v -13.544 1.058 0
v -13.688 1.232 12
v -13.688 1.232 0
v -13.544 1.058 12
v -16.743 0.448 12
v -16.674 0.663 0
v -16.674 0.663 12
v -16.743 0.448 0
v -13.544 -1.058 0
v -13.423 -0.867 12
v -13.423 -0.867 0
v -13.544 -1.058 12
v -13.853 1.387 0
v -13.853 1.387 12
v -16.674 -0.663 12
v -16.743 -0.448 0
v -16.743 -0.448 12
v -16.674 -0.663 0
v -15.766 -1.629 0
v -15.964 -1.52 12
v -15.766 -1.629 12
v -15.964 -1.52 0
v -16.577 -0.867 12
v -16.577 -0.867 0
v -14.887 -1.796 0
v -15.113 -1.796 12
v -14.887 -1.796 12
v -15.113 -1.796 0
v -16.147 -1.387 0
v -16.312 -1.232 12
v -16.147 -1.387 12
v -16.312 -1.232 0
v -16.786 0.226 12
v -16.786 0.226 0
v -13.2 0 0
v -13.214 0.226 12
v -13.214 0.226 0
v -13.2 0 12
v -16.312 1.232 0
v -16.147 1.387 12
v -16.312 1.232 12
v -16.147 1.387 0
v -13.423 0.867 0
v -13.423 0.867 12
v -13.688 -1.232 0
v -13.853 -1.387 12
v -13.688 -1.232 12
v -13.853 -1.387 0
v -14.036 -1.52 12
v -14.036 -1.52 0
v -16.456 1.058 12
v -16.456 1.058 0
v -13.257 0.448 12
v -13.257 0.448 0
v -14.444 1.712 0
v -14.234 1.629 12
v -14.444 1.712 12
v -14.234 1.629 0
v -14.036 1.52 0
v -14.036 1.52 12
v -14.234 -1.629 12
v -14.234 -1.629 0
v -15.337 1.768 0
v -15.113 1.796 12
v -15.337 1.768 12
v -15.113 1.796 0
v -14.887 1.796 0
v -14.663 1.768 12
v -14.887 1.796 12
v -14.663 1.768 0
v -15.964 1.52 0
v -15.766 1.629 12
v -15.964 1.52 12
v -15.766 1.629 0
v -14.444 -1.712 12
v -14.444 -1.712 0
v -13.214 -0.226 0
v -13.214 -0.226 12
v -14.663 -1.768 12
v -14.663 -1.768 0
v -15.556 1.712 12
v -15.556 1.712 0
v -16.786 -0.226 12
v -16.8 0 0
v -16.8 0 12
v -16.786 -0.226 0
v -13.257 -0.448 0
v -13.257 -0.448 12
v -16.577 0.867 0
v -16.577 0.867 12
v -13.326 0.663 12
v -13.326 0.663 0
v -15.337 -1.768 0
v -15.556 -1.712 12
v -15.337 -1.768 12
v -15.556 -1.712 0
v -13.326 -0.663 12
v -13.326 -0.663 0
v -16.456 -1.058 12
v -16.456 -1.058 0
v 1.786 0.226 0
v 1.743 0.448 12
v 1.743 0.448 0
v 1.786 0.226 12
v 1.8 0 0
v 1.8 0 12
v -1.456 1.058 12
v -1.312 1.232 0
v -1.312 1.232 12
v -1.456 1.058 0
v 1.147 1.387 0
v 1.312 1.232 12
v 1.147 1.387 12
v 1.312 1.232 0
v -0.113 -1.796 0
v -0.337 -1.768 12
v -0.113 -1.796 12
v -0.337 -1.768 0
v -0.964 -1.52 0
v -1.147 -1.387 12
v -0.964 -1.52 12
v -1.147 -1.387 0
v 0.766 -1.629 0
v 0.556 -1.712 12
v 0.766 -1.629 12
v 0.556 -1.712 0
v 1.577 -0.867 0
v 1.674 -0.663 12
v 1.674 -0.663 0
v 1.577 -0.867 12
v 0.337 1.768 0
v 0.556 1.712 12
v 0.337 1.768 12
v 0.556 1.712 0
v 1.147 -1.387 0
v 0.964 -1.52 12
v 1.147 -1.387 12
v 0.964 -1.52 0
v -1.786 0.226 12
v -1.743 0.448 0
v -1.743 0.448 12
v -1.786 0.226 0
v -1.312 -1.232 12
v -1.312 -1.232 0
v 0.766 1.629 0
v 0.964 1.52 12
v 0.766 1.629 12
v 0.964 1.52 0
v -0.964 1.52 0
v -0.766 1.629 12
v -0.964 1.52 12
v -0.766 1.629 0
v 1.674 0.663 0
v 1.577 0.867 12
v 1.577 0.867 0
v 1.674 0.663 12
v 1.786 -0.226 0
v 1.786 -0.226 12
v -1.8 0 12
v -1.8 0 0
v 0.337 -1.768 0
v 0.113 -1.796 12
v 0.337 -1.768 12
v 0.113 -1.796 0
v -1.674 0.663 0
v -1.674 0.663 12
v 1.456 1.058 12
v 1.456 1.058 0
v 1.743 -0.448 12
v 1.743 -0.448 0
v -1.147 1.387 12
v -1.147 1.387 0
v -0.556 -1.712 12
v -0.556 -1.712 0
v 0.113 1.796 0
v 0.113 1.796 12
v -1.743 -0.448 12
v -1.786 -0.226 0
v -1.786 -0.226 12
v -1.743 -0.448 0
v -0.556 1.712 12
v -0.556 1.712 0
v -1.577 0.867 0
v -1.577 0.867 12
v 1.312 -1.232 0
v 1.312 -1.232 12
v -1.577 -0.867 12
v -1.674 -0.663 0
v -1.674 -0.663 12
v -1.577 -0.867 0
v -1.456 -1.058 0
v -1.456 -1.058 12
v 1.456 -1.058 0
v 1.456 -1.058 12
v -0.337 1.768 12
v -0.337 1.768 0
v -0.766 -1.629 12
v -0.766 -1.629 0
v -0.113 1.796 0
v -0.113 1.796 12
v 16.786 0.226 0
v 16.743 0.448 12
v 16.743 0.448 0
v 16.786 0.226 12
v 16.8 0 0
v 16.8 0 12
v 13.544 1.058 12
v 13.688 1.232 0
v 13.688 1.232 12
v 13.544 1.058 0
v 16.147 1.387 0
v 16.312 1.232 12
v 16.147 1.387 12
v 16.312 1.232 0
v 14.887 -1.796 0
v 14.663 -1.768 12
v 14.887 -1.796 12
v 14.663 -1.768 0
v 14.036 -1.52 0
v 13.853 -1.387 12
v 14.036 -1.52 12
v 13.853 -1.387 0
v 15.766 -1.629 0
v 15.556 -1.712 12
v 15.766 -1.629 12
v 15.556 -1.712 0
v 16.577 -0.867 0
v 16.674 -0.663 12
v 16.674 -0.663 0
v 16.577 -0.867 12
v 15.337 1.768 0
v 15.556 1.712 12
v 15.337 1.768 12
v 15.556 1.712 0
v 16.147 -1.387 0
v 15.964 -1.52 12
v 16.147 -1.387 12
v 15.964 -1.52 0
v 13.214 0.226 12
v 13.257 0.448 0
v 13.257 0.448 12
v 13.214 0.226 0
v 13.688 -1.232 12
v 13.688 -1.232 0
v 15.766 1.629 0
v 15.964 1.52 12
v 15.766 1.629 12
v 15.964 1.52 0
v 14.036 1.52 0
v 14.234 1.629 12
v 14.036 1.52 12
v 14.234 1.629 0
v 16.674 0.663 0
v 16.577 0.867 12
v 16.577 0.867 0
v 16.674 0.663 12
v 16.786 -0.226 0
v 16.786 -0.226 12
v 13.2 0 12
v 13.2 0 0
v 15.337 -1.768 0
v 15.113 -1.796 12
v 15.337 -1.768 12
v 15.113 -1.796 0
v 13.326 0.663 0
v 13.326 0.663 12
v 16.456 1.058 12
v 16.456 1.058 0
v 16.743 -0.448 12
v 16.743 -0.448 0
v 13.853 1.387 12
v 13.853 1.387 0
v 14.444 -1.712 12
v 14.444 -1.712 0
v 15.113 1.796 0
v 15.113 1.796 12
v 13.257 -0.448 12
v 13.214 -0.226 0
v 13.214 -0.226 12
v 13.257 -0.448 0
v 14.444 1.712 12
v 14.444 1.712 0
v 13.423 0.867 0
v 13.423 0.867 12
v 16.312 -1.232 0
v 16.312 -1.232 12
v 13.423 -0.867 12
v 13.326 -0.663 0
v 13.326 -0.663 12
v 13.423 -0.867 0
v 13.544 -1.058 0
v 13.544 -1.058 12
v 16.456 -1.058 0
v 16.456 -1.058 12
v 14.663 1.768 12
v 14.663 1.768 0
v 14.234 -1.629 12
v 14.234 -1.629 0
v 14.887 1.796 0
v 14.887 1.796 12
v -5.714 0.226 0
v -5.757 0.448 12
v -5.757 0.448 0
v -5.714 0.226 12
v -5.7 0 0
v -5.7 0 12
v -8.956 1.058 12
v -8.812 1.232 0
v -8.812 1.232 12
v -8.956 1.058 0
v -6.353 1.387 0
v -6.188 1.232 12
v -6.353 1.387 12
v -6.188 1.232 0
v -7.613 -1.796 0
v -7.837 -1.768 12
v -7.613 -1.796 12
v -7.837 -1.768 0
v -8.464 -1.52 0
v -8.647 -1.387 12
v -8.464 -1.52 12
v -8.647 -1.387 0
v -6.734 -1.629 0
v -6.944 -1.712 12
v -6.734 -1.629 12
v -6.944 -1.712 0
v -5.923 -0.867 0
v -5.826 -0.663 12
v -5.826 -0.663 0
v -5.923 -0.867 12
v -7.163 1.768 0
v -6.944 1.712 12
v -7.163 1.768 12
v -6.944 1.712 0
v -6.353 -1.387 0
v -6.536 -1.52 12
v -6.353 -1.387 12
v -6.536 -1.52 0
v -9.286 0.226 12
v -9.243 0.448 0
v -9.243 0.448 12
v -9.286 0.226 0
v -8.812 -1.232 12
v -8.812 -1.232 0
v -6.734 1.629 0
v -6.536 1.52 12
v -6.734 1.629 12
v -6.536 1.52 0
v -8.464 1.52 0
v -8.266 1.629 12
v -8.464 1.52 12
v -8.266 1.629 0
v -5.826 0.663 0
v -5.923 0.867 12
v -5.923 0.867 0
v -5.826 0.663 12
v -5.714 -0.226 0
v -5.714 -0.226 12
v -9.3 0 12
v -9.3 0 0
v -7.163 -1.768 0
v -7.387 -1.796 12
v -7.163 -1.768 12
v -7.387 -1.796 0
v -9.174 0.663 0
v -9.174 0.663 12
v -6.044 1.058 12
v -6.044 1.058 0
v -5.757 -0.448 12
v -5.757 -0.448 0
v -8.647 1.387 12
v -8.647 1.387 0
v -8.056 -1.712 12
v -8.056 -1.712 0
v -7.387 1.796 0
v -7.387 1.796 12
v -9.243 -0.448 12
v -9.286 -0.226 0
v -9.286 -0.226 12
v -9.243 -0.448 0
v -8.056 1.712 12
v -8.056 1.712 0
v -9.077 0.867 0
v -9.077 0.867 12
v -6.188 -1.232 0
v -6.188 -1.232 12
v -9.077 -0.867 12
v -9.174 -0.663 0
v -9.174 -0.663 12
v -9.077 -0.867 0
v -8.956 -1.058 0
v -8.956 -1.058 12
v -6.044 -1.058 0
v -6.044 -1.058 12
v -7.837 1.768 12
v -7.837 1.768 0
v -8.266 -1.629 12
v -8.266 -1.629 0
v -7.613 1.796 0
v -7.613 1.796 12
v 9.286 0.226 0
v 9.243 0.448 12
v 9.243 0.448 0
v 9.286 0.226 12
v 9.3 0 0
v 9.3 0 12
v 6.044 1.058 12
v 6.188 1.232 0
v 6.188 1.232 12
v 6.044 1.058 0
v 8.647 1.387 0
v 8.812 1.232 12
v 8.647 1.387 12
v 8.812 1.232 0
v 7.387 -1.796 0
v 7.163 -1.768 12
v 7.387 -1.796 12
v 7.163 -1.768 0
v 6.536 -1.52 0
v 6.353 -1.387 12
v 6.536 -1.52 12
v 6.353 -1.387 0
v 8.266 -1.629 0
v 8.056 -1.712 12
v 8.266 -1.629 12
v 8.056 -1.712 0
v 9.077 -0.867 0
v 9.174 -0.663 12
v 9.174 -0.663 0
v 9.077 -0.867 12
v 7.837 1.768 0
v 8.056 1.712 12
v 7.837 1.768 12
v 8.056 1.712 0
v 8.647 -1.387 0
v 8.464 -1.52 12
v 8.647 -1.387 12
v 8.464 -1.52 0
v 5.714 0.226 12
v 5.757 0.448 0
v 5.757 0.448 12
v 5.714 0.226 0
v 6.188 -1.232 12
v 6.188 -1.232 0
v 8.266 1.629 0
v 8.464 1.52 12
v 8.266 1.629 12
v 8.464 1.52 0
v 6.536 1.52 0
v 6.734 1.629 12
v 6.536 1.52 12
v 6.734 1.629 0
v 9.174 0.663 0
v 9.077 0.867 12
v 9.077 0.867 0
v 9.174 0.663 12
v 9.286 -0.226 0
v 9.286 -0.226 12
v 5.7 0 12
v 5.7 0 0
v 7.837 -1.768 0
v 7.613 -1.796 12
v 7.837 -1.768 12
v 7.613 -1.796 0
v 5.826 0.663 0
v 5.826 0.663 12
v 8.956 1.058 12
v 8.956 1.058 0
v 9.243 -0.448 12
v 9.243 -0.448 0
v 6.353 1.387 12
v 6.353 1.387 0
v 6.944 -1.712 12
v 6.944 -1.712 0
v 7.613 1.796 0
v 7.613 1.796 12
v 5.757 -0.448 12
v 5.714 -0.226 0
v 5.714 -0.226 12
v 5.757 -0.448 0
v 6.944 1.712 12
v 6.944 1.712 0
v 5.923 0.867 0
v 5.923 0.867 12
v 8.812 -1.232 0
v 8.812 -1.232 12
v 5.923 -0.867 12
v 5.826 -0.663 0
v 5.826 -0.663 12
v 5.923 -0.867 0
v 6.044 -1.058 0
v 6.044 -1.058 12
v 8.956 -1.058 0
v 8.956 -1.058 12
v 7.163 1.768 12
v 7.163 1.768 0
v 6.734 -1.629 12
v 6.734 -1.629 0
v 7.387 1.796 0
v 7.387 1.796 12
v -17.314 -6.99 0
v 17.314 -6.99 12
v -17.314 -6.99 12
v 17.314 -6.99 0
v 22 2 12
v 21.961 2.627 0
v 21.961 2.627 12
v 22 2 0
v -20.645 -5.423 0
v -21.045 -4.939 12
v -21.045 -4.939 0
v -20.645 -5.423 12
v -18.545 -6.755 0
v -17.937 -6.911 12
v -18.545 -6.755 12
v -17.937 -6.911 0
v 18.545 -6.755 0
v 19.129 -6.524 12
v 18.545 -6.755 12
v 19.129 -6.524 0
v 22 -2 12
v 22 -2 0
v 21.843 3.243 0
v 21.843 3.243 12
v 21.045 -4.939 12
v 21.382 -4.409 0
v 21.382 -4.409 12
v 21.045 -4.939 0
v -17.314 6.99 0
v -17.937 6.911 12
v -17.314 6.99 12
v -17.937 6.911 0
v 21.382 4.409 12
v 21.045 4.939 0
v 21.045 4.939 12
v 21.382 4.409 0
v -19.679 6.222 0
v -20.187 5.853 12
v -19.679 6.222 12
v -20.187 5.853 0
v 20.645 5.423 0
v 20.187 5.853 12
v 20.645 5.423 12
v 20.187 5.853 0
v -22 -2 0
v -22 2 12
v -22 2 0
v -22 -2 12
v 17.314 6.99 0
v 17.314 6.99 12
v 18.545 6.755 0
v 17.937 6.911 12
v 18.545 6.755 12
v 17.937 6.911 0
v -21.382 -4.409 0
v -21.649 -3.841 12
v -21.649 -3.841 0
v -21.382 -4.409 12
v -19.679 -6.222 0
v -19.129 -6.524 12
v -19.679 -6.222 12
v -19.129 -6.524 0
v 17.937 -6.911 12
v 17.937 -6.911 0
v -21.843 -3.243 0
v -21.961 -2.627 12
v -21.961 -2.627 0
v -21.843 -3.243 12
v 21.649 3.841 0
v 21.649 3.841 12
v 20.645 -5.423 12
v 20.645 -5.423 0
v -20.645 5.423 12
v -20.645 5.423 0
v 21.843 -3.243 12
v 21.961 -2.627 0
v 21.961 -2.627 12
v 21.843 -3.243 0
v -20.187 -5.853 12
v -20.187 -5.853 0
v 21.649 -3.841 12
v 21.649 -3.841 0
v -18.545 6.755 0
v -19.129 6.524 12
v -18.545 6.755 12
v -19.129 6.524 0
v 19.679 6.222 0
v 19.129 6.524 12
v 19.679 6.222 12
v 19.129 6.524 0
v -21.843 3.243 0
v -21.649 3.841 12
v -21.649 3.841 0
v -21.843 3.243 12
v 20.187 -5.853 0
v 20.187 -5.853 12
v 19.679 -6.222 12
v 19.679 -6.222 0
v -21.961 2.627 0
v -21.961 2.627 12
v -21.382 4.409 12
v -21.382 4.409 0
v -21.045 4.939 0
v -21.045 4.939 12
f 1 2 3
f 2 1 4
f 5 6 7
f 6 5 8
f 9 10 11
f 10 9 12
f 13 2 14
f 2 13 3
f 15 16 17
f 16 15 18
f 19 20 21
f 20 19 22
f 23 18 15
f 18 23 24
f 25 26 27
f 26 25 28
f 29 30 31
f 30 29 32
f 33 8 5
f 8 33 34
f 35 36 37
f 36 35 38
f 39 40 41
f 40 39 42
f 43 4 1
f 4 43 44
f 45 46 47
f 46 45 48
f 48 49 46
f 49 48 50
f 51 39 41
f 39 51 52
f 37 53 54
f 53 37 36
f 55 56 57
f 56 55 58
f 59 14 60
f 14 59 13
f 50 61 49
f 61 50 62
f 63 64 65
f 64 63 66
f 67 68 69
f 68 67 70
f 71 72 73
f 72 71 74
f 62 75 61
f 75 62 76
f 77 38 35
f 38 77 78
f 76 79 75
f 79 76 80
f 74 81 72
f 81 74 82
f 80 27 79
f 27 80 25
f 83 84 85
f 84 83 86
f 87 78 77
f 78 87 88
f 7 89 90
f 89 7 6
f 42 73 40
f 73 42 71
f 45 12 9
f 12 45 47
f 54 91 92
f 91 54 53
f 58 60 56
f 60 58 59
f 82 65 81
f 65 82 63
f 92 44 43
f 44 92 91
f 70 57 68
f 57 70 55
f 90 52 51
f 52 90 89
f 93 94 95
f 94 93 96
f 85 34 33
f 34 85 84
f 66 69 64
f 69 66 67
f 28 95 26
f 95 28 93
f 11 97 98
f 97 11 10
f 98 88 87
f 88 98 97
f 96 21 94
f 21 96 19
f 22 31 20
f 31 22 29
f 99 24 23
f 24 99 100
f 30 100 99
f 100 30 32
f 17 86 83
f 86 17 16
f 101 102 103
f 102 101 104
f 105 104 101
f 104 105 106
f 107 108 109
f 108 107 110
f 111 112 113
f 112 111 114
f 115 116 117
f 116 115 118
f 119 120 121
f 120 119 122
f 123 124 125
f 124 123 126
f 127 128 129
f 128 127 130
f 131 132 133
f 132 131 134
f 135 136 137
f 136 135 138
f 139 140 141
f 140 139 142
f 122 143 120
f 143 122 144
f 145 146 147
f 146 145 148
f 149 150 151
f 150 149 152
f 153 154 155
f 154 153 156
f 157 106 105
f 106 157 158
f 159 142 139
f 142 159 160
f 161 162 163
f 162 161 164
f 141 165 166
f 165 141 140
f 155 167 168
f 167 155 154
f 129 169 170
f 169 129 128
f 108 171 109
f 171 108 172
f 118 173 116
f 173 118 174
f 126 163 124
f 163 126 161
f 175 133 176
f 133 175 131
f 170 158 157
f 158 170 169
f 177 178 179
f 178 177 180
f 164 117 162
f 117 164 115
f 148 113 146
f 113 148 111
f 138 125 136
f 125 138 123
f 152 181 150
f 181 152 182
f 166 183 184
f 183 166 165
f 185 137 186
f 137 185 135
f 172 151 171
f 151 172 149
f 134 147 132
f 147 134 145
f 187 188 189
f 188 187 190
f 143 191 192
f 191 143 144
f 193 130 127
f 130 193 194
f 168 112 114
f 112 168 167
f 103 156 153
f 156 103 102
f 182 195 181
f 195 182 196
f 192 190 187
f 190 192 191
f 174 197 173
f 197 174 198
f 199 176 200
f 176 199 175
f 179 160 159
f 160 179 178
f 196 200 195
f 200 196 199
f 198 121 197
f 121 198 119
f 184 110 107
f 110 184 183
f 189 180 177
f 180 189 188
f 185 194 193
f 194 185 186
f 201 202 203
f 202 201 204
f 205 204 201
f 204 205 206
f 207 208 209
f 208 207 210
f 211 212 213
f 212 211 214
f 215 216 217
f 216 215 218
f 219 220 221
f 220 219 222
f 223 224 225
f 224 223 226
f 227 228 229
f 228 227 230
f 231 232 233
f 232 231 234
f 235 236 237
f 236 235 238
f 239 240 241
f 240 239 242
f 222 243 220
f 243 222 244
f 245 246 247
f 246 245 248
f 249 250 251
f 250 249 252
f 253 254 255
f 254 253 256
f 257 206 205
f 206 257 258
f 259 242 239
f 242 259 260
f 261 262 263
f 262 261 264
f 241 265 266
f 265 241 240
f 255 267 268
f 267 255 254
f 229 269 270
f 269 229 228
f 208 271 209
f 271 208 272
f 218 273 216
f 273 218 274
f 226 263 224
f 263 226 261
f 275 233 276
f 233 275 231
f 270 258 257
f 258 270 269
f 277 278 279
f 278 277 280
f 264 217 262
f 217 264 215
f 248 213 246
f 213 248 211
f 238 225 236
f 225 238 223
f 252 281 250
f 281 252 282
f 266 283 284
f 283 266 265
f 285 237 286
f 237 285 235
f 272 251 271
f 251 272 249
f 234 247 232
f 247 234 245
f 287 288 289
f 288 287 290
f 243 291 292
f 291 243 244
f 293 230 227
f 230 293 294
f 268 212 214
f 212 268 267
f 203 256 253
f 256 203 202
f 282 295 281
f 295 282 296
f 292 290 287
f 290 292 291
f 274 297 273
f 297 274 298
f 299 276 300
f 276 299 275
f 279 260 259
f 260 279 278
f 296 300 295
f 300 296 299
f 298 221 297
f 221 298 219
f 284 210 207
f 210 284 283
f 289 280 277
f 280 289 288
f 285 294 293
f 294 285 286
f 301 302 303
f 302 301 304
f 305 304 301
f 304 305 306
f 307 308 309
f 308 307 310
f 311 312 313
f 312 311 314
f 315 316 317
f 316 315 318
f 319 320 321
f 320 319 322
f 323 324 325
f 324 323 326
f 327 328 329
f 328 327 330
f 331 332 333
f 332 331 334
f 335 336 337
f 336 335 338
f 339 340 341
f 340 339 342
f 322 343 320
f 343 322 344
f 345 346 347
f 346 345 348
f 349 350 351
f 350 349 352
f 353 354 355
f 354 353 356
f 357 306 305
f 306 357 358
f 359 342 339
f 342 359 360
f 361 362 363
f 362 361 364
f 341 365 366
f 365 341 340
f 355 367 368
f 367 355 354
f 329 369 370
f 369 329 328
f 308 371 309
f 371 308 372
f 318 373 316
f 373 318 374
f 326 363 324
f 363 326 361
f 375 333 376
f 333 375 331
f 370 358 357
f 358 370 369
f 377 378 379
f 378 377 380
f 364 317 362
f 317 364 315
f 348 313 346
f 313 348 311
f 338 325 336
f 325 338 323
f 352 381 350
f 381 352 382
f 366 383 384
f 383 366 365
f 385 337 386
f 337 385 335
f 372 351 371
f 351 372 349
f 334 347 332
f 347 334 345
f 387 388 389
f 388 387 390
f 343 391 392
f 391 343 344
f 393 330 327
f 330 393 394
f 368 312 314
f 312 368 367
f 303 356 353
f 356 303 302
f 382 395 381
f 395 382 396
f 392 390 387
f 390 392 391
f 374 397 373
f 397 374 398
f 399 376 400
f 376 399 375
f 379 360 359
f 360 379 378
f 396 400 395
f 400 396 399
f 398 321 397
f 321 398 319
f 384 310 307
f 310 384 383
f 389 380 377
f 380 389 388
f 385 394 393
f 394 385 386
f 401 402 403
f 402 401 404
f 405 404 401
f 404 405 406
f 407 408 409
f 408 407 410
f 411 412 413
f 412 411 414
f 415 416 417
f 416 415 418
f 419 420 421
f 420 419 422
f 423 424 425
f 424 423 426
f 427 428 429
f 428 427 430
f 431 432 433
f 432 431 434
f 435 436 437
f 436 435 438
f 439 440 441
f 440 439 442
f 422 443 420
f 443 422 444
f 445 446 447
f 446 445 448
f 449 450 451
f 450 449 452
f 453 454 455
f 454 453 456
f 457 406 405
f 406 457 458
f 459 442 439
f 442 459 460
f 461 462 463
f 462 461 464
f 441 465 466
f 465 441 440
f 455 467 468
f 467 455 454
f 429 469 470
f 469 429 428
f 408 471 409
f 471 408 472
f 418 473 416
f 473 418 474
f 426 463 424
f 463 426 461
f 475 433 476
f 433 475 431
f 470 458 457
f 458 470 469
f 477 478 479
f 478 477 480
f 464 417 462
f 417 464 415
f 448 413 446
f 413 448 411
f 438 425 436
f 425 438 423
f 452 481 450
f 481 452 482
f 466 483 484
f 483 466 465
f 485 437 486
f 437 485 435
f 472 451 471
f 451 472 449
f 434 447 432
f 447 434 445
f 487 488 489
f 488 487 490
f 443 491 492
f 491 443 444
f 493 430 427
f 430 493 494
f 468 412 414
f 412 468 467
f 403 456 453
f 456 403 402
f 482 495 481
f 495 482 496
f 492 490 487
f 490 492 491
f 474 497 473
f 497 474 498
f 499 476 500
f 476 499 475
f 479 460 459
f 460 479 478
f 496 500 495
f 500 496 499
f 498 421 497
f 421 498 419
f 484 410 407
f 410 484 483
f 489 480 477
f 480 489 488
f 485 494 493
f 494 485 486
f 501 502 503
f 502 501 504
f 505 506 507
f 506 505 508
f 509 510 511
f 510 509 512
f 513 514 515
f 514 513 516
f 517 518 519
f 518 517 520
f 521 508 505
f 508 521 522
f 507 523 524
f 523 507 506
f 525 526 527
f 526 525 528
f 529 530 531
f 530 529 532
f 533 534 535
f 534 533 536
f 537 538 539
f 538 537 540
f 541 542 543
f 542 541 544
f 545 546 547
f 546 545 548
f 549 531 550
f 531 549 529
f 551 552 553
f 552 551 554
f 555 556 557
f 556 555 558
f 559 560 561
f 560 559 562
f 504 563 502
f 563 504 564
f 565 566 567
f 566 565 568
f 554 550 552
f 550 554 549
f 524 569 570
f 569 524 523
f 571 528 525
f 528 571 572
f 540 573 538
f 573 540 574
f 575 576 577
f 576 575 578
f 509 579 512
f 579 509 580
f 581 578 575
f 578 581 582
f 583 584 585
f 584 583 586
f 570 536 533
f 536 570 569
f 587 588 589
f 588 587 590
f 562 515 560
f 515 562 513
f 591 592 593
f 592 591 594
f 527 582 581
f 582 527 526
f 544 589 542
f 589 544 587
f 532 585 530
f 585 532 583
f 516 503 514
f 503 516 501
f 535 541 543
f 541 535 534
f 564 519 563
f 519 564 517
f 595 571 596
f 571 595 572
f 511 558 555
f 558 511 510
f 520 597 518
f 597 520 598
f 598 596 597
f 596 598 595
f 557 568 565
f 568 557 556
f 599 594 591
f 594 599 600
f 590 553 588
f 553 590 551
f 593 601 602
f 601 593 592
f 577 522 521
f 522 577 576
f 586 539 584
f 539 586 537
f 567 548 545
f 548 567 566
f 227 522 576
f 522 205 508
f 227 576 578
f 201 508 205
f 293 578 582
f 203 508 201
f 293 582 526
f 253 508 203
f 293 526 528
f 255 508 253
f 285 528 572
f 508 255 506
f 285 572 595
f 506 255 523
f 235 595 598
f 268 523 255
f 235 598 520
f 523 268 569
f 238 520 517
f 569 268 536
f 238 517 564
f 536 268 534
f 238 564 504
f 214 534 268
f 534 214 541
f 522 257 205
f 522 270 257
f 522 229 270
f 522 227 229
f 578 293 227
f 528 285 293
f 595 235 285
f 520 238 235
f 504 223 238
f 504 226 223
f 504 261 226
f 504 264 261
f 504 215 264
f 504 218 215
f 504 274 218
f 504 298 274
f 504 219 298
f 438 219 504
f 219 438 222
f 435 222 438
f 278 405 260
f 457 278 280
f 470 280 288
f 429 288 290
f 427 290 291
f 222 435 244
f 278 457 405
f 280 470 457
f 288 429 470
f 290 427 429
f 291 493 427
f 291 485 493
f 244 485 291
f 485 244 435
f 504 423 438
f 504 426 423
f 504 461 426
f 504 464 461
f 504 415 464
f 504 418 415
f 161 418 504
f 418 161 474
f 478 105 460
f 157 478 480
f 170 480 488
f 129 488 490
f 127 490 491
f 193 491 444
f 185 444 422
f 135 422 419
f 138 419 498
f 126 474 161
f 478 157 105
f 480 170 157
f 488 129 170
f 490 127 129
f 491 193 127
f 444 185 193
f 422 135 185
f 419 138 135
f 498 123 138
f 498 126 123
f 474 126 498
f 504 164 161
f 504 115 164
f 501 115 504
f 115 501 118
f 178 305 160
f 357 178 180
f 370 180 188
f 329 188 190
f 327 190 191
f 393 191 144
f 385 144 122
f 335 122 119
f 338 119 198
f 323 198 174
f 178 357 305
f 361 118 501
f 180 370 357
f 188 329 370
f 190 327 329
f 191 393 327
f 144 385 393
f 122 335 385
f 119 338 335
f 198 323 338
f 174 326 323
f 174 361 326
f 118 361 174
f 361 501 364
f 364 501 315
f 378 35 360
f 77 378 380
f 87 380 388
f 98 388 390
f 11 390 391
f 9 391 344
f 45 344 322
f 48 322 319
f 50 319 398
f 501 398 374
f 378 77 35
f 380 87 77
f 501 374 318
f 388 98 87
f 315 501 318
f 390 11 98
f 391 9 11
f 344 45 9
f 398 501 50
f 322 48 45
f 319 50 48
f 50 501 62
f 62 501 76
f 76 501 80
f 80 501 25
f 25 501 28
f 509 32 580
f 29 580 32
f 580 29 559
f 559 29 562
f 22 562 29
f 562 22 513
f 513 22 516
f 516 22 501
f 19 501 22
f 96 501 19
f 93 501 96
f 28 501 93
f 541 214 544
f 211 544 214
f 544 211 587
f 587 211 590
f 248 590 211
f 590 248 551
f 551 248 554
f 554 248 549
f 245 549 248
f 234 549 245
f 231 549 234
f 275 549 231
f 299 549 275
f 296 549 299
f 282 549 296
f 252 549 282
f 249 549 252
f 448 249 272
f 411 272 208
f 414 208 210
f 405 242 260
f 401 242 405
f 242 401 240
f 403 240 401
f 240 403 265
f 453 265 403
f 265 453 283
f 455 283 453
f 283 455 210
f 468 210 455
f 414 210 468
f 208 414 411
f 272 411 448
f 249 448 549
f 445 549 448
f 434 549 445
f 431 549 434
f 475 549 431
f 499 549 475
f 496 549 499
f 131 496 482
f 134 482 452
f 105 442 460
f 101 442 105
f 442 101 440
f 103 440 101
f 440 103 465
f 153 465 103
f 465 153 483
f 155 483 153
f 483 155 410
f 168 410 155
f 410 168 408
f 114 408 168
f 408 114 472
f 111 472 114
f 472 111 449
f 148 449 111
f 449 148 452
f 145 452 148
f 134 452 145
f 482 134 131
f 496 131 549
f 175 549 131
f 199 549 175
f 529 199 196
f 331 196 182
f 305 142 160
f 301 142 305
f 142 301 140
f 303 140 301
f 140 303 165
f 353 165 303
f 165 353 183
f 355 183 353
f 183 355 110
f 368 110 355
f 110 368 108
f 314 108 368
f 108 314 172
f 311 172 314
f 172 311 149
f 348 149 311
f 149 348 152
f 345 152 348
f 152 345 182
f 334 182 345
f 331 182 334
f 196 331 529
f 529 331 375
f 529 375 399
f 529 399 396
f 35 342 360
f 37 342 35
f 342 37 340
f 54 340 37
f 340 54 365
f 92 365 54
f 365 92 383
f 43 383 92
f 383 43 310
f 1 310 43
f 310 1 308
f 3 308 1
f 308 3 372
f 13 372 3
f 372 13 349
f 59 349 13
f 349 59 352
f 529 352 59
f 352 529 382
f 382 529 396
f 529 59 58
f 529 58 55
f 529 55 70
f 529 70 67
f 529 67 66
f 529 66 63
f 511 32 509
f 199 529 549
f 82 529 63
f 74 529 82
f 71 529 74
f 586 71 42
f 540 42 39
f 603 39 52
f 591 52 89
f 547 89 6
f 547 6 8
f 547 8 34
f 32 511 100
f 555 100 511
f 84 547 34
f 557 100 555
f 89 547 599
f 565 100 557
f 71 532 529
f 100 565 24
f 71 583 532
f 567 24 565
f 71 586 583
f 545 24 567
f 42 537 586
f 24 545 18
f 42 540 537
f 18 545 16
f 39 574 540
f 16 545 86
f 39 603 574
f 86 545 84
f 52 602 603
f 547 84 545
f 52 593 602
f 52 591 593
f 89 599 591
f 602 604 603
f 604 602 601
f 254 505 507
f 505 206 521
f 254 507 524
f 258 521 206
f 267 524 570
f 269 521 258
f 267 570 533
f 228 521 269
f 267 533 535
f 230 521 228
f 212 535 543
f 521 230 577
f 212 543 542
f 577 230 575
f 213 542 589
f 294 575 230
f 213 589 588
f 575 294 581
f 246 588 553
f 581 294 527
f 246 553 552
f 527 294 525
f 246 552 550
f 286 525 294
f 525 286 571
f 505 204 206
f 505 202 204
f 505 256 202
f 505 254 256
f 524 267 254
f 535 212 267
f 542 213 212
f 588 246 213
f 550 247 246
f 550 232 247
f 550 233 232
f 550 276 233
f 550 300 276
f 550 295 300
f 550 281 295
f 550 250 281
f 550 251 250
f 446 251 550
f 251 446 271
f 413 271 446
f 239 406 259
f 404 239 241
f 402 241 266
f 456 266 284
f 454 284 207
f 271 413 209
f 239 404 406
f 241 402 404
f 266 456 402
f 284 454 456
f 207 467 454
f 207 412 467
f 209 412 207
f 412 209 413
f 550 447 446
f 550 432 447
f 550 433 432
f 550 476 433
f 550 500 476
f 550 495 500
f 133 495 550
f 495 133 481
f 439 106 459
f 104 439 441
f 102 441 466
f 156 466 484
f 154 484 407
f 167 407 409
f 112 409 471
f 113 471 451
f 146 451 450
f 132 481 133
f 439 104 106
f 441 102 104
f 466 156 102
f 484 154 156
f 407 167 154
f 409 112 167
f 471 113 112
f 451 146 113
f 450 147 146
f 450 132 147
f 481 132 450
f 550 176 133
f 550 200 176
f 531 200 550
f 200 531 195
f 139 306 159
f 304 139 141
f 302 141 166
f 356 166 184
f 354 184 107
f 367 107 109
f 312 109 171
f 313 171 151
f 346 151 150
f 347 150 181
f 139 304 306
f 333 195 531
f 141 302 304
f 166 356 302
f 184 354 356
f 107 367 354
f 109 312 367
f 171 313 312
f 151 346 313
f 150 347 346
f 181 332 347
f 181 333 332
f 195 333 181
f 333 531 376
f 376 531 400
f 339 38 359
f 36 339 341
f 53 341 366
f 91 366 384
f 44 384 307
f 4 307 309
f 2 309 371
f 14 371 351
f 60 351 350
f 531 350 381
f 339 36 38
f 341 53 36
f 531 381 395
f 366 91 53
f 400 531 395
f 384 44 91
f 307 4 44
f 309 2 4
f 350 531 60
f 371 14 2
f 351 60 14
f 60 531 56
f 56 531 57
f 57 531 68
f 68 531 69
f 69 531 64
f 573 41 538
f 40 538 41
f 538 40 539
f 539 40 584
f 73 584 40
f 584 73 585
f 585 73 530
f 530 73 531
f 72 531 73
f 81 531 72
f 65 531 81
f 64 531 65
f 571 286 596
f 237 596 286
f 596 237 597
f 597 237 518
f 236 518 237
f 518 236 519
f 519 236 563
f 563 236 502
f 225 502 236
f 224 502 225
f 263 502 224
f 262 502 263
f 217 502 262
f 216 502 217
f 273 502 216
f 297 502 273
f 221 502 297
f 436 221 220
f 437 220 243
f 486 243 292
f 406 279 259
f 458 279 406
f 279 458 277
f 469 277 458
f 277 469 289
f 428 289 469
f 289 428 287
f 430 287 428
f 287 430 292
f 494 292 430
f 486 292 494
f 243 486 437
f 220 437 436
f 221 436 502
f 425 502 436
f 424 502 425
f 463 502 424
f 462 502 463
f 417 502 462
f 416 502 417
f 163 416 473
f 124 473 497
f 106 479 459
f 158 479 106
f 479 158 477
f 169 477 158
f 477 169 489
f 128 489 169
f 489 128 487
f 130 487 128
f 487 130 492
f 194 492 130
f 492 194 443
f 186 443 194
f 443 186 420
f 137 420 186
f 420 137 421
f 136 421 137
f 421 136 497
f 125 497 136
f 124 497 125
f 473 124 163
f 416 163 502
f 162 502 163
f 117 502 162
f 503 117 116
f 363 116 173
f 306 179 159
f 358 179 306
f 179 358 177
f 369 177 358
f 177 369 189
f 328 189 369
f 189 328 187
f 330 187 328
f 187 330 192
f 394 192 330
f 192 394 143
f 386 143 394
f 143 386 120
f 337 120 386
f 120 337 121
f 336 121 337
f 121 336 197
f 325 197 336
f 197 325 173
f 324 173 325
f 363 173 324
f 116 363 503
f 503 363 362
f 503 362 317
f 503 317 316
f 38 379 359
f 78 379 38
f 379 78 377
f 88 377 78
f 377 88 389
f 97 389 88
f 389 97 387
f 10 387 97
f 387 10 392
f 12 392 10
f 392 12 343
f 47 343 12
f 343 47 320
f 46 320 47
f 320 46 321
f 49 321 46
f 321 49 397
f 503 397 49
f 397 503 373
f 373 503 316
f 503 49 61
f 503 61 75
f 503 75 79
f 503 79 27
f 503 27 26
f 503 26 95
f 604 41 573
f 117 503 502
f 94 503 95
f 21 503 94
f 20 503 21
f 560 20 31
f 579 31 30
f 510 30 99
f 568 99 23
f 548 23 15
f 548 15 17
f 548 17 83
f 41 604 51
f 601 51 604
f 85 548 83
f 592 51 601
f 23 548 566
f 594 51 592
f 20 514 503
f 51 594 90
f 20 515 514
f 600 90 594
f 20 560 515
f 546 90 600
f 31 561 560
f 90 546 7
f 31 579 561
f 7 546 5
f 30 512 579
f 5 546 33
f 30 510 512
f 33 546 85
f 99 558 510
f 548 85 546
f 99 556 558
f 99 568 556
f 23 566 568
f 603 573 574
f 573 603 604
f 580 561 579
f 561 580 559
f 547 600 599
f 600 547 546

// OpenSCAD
$fn = 50;


difference() {
	union() {
		hull() {
			translate(v = [-17.0000000000, 2.0000000000, 0]) {
				cylinder(h = 12, r = 5);
			}
			translate(v = [17.0000000000, 2.0000000000, 0]) {
				cylinder(h = 12, r = 5);
			}
			translate(v = [-17.0000000000, -2.0000000000, 0]) {
				cylinder(h = 12, r = 5);
			}
			translate(v = [17.0000000000, -2.0000000000, 0]) {
				cylinder(h = 12, r = 5);
			}
		}
	}
	union() {
		translate(v = [-15.0000000000, 0.0000000000, 0]) {
			translate(v = [0, 0, -100]) {
				cylinder(h = 200, r = 1.8000000000);
			}
		}
		translate(v = [0, 0, -100]) {
			cylinder(h = 200, r = 1.8000000000);
		}
		translate(v = [15.0000000000, 0.0000000000, 0]) {
			translate(v = [0, 0, -100]) {
				cylinder(h = 200, r = 1.8000000000);
			}
		}
		translate(v = [-15.0000000000, 0.0000000000, 0]) {
			translate(v = [0, 0, -100]) {
				cylinder(h = 200, r = 1.8000000000);
			}
		}
		translate(v = [-7.5000000000, 0.0000000000, 0]) {
			translate(v = [0, 0, -100]) {
				cylinder(h = 200, r = 1.8000000000);
			}
		}
		translate(v = [0, 0, -100]) {
			cylinder(h = 200, r = 1.8000000000);
		}
		translate(v = [7.5000000000, 0.0000000000, 0]) {
			translate(v = [0, 0, -100]) {
				cylinder(h = 200, r = 1.8000000000);
			}
		}
		translate(v = [15.0000000000, 0.0000000000, 0]) {
			translate(v = [0, 0, -100]) {
				cylinder(h = 200, r = 1.8000000000);
			}
		}
	}
}
